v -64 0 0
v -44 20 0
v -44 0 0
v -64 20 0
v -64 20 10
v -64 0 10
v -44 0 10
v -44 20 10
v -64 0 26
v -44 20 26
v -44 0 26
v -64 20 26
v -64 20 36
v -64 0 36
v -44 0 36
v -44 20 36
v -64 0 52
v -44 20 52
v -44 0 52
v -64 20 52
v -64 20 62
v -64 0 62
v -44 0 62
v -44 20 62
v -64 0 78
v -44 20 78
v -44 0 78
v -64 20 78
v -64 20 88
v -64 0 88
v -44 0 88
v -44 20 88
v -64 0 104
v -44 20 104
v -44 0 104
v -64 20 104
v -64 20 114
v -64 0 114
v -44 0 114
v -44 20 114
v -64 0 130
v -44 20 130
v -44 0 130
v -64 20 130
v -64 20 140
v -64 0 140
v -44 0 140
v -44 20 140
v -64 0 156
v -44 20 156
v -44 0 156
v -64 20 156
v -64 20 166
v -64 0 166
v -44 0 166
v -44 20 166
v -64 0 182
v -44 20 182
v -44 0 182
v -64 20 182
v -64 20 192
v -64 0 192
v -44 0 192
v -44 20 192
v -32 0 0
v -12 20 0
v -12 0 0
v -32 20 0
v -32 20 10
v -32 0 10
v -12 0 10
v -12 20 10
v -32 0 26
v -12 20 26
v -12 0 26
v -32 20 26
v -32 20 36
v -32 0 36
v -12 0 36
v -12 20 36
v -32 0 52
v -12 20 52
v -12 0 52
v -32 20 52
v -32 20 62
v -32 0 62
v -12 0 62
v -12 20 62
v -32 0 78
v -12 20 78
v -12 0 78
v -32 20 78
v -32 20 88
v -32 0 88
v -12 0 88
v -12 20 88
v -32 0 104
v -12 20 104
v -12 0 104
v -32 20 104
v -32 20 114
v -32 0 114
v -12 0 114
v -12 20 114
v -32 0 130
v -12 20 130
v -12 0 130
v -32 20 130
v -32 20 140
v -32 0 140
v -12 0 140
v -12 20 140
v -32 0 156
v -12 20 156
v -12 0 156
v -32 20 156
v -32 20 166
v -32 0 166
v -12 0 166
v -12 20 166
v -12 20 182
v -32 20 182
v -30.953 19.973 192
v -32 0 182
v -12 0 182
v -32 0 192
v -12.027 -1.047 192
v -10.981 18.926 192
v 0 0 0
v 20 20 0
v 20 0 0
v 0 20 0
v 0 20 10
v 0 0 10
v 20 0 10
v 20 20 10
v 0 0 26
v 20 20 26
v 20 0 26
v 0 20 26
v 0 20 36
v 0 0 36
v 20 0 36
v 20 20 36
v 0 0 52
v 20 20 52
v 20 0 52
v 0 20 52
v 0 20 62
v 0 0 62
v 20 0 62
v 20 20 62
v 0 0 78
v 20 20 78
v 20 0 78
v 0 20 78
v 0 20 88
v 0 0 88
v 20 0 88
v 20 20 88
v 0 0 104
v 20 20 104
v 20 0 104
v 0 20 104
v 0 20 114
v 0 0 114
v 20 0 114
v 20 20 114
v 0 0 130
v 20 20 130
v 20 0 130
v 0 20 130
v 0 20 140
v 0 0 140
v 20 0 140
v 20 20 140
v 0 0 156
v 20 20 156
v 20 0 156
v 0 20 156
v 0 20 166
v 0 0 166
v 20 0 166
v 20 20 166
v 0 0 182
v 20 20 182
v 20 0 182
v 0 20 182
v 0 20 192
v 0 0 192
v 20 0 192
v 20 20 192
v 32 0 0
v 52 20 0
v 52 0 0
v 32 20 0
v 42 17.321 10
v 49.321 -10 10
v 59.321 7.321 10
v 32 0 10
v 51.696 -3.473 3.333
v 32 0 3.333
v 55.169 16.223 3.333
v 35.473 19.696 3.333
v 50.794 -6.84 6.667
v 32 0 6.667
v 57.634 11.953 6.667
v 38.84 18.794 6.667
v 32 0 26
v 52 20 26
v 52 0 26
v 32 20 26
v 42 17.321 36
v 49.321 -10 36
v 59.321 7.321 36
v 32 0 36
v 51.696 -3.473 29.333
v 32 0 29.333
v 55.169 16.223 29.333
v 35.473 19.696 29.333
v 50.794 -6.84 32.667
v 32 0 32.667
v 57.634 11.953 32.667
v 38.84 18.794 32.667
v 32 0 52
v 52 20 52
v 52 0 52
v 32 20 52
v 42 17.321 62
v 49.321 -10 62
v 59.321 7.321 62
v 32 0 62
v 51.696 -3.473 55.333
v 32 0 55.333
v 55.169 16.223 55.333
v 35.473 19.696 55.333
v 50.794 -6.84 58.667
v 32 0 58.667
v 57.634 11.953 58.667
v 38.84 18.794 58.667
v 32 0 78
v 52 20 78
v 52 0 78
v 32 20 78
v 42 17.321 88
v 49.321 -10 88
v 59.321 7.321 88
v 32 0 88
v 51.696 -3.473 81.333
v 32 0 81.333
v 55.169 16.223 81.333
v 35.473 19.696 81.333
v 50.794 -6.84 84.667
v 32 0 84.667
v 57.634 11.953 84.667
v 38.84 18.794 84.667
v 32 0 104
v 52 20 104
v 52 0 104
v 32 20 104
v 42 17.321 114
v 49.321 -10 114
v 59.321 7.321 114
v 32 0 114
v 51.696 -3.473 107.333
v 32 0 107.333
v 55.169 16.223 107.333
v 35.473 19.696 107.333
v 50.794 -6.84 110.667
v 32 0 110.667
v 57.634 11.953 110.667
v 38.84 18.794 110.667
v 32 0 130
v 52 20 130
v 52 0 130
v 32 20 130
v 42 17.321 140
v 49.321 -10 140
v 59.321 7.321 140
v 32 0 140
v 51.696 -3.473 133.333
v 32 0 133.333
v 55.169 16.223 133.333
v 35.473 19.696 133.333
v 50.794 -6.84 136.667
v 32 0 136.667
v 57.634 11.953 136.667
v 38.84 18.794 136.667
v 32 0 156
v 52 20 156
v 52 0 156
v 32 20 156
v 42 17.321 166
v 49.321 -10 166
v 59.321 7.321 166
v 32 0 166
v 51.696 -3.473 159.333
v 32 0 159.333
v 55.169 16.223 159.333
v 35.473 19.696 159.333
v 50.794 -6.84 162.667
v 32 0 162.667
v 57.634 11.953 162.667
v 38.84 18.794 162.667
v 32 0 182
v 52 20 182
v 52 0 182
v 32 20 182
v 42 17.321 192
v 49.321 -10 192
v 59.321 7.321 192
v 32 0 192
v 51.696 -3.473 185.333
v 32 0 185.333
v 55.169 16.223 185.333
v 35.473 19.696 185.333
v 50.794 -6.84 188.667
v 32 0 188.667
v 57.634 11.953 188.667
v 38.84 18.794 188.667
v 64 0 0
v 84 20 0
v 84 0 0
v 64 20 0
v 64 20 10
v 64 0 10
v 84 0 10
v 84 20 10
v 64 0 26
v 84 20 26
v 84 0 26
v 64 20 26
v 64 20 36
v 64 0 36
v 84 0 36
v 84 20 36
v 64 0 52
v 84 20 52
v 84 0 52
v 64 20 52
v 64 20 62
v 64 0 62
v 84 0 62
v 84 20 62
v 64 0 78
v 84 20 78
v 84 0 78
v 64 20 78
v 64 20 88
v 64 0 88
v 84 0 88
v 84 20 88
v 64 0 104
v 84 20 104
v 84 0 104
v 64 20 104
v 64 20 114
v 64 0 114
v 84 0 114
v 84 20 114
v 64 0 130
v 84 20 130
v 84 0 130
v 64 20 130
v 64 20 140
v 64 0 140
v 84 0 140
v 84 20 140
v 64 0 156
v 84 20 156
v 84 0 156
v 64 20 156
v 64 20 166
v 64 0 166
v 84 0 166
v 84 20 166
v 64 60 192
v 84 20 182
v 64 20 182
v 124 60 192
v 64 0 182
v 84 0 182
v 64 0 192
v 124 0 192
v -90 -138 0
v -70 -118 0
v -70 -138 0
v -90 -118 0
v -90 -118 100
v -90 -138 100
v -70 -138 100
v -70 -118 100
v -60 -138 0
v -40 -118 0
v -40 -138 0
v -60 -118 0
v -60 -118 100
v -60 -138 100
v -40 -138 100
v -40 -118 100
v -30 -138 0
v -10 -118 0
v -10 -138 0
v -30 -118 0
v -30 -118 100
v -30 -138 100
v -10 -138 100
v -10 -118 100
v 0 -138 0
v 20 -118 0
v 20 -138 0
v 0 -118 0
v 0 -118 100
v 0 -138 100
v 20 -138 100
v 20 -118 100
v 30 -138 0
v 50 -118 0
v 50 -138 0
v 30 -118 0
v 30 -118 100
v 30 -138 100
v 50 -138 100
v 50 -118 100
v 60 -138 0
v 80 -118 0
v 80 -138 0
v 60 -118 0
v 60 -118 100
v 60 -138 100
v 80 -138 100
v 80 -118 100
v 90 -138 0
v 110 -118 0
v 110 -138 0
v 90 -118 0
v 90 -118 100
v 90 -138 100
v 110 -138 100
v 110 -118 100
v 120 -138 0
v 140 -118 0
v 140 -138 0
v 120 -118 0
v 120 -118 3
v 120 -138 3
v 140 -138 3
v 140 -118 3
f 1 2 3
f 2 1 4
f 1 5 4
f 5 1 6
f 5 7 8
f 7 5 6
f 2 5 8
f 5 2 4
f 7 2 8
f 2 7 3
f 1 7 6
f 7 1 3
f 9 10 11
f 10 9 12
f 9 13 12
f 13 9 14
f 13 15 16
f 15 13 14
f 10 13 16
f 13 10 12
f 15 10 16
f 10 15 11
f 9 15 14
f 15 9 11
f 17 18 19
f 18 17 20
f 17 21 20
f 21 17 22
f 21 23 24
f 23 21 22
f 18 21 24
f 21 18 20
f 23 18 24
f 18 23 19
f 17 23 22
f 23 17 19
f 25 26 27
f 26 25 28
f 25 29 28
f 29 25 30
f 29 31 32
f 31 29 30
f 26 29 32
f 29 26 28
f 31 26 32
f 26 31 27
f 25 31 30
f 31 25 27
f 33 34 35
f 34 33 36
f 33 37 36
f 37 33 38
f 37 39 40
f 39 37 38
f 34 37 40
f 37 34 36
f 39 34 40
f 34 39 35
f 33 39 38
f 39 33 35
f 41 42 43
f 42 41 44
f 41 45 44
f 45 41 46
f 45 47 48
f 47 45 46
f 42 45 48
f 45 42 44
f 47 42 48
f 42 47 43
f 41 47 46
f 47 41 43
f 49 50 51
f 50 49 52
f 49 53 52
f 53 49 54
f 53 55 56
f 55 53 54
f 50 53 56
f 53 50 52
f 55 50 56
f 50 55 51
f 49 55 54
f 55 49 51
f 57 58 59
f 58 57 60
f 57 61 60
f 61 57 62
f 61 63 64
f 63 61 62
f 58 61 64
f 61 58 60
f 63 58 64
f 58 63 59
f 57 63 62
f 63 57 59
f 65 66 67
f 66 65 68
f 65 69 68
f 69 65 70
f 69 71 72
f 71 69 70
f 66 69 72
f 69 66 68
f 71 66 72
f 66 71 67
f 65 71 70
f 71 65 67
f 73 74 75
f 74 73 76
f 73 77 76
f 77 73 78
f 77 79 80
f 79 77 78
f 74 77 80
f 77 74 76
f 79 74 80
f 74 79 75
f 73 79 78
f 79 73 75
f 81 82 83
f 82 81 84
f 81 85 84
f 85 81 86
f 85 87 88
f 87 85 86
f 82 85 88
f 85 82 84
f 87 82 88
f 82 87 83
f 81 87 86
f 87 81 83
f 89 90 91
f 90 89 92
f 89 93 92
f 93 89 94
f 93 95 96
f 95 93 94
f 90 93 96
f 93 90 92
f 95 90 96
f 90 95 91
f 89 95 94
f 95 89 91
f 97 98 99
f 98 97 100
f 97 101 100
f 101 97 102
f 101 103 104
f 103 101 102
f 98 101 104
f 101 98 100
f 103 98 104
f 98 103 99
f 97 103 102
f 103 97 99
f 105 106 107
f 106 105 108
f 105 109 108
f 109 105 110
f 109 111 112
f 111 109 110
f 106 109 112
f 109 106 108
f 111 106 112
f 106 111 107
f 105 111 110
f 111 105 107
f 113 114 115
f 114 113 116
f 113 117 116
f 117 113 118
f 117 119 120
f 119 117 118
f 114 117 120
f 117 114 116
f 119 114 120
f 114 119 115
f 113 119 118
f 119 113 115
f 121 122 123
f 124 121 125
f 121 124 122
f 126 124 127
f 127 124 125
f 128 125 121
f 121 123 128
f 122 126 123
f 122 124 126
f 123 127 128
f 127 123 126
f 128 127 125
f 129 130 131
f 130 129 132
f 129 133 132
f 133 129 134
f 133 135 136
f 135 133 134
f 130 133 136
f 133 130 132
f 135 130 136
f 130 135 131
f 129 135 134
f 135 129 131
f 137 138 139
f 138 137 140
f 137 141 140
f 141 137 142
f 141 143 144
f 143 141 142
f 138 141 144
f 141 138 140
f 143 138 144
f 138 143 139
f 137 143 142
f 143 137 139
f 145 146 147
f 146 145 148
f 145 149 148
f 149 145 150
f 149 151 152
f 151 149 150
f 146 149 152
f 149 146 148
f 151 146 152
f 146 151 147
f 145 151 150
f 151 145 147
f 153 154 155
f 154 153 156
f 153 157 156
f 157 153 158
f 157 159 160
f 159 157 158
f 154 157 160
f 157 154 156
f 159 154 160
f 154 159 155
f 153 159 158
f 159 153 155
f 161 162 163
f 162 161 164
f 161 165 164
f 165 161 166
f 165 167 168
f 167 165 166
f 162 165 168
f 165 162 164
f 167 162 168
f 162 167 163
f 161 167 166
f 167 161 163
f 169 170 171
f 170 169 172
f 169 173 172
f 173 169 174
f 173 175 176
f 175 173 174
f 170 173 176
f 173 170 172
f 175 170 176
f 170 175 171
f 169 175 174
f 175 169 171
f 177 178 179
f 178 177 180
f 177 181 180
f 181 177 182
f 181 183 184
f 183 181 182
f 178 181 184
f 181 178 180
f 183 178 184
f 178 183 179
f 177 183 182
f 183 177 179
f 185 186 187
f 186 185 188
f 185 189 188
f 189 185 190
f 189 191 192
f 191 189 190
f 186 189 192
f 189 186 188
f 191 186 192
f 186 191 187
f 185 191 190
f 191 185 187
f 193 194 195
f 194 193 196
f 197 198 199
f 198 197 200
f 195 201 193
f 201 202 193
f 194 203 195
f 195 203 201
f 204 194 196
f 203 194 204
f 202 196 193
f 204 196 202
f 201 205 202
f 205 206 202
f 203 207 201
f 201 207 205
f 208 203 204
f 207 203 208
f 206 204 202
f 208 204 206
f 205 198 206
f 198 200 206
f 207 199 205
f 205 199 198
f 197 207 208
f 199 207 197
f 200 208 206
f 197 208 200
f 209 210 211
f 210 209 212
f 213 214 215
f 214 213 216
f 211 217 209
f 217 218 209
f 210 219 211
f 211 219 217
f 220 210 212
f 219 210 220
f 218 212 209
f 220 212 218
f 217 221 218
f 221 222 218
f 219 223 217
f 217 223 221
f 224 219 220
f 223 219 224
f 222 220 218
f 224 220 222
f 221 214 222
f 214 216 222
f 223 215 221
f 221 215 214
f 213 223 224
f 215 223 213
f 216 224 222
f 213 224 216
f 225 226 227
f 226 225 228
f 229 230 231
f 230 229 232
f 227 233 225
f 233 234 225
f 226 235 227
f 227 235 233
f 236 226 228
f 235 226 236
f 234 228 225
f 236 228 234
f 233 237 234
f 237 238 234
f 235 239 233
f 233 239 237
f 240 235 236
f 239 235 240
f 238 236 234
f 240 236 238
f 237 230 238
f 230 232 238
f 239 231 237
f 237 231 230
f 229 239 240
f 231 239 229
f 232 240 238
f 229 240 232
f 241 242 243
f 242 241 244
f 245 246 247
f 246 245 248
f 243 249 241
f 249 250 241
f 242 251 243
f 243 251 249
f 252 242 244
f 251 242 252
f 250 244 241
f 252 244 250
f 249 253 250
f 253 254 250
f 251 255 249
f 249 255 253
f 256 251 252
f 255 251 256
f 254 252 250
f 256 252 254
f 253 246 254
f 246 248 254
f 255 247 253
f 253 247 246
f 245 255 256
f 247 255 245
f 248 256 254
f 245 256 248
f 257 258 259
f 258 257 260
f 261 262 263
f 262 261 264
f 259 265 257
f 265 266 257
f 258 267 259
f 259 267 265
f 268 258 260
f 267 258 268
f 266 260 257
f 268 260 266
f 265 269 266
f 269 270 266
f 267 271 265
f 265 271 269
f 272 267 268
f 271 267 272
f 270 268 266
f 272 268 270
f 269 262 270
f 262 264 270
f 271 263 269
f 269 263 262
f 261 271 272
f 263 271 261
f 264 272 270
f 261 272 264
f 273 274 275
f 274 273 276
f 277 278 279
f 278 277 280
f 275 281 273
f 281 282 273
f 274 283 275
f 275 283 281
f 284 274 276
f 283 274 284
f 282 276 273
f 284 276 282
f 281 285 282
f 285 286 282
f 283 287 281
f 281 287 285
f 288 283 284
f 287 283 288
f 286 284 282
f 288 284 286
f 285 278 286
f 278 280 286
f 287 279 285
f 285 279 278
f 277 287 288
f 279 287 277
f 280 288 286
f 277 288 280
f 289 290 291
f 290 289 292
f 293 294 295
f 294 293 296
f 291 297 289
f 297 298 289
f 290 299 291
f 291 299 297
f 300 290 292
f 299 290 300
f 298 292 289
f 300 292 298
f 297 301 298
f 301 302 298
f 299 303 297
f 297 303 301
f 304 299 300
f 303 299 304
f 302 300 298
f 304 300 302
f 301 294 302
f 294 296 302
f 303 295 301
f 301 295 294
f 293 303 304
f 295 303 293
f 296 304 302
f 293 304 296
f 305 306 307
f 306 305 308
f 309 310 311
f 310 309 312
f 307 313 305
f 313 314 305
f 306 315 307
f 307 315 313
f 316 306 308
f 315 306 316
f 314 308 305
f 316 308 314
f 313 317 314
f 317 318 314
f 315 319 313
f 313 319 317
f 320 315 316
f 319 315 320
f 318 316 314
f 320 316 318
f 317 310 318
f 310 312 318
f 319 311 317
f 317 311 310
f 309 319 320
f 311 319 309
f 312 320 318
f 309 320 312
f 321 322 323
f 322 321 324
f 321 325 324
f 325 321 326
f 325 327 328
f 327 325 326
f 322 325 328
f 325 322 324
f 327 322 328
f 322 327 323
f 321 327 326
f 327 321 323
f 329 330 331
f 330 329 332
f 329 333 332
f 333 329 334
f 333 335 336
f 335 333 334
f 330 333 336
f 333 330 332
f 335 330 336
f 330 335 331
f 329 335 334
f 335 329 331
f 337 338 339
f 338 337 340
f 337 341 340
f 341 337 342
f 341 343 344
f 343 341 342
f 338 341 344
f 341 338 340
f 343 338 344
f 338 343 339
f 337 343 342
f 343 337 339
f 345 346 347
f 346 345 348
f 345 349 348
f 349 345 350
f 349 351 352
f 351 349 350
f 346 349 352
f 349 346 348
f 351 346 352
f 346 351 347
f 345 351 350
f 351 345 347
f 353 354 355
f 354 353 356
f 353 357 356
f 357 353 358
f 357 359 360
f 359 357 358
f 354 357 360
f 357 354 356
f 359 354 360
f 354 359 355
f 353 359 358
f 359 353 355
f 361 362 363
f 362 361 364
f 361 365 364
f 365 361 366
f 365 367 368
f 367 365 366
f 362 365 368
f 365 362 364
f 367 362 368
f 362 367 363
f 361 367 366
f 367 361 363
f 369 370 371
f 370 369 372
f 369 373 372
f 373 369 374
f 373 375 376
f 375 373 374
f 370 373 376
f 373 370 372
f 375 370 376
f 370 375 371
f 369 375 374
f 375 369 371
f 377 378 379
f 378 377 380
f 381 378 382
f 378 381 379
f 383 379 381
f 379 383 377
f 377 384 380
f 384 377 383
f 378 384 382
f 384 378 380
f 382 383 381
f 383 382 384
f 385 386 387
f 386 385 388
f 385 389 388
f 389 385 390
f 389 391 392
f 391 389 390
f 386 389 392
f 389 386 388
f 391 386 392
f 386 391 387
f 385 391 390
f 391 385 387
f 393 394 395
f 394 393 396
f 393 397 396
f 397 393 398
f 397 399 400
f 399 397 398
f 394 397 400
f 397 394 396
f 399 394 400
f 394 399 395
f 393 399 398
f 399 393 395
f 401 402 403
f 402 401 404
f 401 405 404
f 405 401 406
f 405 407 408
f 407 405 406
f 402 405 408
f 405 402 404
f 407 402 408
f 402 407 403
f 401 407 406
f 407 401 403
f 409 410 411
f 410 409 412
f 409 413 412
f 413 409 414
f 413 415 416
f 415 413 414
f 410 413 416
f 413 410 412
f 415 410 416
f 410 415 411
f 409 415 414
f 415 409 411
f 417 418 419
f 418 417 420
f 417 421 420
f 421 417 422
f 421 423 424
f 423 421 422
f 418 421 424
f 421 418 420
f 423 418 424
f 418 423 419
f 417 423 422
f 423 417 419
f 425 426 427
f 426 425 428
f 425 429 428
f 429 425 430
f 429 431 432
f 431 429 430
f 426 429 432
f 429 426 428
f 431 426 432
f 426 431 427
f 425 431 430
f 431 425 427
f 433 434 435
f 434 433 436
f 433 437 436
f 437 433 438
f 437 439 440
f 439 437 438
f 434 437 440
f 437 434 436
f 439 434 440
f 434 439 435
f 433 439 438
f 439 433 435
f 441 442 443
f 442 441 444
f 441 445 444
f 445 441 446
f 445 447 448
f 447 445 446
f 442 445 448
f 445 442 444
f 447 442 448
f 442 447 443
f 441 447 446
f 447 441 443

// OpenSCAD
// test cases for linear extrude with various (invalid) parameters
ox = 32;
oz = 26;
params = [ [0, undef], [1, 1/0], [2, -1/0], [3, 0/0], [4, ""], [5, true], [6, [1:3]], [7, 3] ];


for (a = params) translate([-2*ox, 0, oz * a[0]])
color("red") linear_extrude(height = 10, convexity = a[1]) square(20);

for (a = params) translate([-ox, 0, oz * a[0]])
color("yellow") linear_extrude(height = 10, convexity = undef, scale = 1, twist = a[1]) square(20);

for (a = params) translate([0, 0, oz * a[0]])
color("gray") linear_extrude(height = 10, convexity = undef, scale = 1, twist = 0, slices = a[1]) square(20);

// Test that when both height and h are specified there's a warning and height wins.
// Specify height first.
for (a = params) translate([ox, 0, oz * a[0]])
color("purple") linear_extrude(height = 10, h=27, convexity = undef, scale = 1, twist = 30, slices = a[1]) square(20);

// Test that when both height and h are specified there's a warning and height wins.
// Specify h first.
for (a = params) translate([2*ox, 0, oz * a[0]])
color("blue") linear_extrude(h=27, height = 10, convexity = 2, scale = a[1]) square(20);

for (a = params) translate([(a[0] - 3) * 30, -138, 0])
color("green") linear_extrude(height = a[1]) square(20);
